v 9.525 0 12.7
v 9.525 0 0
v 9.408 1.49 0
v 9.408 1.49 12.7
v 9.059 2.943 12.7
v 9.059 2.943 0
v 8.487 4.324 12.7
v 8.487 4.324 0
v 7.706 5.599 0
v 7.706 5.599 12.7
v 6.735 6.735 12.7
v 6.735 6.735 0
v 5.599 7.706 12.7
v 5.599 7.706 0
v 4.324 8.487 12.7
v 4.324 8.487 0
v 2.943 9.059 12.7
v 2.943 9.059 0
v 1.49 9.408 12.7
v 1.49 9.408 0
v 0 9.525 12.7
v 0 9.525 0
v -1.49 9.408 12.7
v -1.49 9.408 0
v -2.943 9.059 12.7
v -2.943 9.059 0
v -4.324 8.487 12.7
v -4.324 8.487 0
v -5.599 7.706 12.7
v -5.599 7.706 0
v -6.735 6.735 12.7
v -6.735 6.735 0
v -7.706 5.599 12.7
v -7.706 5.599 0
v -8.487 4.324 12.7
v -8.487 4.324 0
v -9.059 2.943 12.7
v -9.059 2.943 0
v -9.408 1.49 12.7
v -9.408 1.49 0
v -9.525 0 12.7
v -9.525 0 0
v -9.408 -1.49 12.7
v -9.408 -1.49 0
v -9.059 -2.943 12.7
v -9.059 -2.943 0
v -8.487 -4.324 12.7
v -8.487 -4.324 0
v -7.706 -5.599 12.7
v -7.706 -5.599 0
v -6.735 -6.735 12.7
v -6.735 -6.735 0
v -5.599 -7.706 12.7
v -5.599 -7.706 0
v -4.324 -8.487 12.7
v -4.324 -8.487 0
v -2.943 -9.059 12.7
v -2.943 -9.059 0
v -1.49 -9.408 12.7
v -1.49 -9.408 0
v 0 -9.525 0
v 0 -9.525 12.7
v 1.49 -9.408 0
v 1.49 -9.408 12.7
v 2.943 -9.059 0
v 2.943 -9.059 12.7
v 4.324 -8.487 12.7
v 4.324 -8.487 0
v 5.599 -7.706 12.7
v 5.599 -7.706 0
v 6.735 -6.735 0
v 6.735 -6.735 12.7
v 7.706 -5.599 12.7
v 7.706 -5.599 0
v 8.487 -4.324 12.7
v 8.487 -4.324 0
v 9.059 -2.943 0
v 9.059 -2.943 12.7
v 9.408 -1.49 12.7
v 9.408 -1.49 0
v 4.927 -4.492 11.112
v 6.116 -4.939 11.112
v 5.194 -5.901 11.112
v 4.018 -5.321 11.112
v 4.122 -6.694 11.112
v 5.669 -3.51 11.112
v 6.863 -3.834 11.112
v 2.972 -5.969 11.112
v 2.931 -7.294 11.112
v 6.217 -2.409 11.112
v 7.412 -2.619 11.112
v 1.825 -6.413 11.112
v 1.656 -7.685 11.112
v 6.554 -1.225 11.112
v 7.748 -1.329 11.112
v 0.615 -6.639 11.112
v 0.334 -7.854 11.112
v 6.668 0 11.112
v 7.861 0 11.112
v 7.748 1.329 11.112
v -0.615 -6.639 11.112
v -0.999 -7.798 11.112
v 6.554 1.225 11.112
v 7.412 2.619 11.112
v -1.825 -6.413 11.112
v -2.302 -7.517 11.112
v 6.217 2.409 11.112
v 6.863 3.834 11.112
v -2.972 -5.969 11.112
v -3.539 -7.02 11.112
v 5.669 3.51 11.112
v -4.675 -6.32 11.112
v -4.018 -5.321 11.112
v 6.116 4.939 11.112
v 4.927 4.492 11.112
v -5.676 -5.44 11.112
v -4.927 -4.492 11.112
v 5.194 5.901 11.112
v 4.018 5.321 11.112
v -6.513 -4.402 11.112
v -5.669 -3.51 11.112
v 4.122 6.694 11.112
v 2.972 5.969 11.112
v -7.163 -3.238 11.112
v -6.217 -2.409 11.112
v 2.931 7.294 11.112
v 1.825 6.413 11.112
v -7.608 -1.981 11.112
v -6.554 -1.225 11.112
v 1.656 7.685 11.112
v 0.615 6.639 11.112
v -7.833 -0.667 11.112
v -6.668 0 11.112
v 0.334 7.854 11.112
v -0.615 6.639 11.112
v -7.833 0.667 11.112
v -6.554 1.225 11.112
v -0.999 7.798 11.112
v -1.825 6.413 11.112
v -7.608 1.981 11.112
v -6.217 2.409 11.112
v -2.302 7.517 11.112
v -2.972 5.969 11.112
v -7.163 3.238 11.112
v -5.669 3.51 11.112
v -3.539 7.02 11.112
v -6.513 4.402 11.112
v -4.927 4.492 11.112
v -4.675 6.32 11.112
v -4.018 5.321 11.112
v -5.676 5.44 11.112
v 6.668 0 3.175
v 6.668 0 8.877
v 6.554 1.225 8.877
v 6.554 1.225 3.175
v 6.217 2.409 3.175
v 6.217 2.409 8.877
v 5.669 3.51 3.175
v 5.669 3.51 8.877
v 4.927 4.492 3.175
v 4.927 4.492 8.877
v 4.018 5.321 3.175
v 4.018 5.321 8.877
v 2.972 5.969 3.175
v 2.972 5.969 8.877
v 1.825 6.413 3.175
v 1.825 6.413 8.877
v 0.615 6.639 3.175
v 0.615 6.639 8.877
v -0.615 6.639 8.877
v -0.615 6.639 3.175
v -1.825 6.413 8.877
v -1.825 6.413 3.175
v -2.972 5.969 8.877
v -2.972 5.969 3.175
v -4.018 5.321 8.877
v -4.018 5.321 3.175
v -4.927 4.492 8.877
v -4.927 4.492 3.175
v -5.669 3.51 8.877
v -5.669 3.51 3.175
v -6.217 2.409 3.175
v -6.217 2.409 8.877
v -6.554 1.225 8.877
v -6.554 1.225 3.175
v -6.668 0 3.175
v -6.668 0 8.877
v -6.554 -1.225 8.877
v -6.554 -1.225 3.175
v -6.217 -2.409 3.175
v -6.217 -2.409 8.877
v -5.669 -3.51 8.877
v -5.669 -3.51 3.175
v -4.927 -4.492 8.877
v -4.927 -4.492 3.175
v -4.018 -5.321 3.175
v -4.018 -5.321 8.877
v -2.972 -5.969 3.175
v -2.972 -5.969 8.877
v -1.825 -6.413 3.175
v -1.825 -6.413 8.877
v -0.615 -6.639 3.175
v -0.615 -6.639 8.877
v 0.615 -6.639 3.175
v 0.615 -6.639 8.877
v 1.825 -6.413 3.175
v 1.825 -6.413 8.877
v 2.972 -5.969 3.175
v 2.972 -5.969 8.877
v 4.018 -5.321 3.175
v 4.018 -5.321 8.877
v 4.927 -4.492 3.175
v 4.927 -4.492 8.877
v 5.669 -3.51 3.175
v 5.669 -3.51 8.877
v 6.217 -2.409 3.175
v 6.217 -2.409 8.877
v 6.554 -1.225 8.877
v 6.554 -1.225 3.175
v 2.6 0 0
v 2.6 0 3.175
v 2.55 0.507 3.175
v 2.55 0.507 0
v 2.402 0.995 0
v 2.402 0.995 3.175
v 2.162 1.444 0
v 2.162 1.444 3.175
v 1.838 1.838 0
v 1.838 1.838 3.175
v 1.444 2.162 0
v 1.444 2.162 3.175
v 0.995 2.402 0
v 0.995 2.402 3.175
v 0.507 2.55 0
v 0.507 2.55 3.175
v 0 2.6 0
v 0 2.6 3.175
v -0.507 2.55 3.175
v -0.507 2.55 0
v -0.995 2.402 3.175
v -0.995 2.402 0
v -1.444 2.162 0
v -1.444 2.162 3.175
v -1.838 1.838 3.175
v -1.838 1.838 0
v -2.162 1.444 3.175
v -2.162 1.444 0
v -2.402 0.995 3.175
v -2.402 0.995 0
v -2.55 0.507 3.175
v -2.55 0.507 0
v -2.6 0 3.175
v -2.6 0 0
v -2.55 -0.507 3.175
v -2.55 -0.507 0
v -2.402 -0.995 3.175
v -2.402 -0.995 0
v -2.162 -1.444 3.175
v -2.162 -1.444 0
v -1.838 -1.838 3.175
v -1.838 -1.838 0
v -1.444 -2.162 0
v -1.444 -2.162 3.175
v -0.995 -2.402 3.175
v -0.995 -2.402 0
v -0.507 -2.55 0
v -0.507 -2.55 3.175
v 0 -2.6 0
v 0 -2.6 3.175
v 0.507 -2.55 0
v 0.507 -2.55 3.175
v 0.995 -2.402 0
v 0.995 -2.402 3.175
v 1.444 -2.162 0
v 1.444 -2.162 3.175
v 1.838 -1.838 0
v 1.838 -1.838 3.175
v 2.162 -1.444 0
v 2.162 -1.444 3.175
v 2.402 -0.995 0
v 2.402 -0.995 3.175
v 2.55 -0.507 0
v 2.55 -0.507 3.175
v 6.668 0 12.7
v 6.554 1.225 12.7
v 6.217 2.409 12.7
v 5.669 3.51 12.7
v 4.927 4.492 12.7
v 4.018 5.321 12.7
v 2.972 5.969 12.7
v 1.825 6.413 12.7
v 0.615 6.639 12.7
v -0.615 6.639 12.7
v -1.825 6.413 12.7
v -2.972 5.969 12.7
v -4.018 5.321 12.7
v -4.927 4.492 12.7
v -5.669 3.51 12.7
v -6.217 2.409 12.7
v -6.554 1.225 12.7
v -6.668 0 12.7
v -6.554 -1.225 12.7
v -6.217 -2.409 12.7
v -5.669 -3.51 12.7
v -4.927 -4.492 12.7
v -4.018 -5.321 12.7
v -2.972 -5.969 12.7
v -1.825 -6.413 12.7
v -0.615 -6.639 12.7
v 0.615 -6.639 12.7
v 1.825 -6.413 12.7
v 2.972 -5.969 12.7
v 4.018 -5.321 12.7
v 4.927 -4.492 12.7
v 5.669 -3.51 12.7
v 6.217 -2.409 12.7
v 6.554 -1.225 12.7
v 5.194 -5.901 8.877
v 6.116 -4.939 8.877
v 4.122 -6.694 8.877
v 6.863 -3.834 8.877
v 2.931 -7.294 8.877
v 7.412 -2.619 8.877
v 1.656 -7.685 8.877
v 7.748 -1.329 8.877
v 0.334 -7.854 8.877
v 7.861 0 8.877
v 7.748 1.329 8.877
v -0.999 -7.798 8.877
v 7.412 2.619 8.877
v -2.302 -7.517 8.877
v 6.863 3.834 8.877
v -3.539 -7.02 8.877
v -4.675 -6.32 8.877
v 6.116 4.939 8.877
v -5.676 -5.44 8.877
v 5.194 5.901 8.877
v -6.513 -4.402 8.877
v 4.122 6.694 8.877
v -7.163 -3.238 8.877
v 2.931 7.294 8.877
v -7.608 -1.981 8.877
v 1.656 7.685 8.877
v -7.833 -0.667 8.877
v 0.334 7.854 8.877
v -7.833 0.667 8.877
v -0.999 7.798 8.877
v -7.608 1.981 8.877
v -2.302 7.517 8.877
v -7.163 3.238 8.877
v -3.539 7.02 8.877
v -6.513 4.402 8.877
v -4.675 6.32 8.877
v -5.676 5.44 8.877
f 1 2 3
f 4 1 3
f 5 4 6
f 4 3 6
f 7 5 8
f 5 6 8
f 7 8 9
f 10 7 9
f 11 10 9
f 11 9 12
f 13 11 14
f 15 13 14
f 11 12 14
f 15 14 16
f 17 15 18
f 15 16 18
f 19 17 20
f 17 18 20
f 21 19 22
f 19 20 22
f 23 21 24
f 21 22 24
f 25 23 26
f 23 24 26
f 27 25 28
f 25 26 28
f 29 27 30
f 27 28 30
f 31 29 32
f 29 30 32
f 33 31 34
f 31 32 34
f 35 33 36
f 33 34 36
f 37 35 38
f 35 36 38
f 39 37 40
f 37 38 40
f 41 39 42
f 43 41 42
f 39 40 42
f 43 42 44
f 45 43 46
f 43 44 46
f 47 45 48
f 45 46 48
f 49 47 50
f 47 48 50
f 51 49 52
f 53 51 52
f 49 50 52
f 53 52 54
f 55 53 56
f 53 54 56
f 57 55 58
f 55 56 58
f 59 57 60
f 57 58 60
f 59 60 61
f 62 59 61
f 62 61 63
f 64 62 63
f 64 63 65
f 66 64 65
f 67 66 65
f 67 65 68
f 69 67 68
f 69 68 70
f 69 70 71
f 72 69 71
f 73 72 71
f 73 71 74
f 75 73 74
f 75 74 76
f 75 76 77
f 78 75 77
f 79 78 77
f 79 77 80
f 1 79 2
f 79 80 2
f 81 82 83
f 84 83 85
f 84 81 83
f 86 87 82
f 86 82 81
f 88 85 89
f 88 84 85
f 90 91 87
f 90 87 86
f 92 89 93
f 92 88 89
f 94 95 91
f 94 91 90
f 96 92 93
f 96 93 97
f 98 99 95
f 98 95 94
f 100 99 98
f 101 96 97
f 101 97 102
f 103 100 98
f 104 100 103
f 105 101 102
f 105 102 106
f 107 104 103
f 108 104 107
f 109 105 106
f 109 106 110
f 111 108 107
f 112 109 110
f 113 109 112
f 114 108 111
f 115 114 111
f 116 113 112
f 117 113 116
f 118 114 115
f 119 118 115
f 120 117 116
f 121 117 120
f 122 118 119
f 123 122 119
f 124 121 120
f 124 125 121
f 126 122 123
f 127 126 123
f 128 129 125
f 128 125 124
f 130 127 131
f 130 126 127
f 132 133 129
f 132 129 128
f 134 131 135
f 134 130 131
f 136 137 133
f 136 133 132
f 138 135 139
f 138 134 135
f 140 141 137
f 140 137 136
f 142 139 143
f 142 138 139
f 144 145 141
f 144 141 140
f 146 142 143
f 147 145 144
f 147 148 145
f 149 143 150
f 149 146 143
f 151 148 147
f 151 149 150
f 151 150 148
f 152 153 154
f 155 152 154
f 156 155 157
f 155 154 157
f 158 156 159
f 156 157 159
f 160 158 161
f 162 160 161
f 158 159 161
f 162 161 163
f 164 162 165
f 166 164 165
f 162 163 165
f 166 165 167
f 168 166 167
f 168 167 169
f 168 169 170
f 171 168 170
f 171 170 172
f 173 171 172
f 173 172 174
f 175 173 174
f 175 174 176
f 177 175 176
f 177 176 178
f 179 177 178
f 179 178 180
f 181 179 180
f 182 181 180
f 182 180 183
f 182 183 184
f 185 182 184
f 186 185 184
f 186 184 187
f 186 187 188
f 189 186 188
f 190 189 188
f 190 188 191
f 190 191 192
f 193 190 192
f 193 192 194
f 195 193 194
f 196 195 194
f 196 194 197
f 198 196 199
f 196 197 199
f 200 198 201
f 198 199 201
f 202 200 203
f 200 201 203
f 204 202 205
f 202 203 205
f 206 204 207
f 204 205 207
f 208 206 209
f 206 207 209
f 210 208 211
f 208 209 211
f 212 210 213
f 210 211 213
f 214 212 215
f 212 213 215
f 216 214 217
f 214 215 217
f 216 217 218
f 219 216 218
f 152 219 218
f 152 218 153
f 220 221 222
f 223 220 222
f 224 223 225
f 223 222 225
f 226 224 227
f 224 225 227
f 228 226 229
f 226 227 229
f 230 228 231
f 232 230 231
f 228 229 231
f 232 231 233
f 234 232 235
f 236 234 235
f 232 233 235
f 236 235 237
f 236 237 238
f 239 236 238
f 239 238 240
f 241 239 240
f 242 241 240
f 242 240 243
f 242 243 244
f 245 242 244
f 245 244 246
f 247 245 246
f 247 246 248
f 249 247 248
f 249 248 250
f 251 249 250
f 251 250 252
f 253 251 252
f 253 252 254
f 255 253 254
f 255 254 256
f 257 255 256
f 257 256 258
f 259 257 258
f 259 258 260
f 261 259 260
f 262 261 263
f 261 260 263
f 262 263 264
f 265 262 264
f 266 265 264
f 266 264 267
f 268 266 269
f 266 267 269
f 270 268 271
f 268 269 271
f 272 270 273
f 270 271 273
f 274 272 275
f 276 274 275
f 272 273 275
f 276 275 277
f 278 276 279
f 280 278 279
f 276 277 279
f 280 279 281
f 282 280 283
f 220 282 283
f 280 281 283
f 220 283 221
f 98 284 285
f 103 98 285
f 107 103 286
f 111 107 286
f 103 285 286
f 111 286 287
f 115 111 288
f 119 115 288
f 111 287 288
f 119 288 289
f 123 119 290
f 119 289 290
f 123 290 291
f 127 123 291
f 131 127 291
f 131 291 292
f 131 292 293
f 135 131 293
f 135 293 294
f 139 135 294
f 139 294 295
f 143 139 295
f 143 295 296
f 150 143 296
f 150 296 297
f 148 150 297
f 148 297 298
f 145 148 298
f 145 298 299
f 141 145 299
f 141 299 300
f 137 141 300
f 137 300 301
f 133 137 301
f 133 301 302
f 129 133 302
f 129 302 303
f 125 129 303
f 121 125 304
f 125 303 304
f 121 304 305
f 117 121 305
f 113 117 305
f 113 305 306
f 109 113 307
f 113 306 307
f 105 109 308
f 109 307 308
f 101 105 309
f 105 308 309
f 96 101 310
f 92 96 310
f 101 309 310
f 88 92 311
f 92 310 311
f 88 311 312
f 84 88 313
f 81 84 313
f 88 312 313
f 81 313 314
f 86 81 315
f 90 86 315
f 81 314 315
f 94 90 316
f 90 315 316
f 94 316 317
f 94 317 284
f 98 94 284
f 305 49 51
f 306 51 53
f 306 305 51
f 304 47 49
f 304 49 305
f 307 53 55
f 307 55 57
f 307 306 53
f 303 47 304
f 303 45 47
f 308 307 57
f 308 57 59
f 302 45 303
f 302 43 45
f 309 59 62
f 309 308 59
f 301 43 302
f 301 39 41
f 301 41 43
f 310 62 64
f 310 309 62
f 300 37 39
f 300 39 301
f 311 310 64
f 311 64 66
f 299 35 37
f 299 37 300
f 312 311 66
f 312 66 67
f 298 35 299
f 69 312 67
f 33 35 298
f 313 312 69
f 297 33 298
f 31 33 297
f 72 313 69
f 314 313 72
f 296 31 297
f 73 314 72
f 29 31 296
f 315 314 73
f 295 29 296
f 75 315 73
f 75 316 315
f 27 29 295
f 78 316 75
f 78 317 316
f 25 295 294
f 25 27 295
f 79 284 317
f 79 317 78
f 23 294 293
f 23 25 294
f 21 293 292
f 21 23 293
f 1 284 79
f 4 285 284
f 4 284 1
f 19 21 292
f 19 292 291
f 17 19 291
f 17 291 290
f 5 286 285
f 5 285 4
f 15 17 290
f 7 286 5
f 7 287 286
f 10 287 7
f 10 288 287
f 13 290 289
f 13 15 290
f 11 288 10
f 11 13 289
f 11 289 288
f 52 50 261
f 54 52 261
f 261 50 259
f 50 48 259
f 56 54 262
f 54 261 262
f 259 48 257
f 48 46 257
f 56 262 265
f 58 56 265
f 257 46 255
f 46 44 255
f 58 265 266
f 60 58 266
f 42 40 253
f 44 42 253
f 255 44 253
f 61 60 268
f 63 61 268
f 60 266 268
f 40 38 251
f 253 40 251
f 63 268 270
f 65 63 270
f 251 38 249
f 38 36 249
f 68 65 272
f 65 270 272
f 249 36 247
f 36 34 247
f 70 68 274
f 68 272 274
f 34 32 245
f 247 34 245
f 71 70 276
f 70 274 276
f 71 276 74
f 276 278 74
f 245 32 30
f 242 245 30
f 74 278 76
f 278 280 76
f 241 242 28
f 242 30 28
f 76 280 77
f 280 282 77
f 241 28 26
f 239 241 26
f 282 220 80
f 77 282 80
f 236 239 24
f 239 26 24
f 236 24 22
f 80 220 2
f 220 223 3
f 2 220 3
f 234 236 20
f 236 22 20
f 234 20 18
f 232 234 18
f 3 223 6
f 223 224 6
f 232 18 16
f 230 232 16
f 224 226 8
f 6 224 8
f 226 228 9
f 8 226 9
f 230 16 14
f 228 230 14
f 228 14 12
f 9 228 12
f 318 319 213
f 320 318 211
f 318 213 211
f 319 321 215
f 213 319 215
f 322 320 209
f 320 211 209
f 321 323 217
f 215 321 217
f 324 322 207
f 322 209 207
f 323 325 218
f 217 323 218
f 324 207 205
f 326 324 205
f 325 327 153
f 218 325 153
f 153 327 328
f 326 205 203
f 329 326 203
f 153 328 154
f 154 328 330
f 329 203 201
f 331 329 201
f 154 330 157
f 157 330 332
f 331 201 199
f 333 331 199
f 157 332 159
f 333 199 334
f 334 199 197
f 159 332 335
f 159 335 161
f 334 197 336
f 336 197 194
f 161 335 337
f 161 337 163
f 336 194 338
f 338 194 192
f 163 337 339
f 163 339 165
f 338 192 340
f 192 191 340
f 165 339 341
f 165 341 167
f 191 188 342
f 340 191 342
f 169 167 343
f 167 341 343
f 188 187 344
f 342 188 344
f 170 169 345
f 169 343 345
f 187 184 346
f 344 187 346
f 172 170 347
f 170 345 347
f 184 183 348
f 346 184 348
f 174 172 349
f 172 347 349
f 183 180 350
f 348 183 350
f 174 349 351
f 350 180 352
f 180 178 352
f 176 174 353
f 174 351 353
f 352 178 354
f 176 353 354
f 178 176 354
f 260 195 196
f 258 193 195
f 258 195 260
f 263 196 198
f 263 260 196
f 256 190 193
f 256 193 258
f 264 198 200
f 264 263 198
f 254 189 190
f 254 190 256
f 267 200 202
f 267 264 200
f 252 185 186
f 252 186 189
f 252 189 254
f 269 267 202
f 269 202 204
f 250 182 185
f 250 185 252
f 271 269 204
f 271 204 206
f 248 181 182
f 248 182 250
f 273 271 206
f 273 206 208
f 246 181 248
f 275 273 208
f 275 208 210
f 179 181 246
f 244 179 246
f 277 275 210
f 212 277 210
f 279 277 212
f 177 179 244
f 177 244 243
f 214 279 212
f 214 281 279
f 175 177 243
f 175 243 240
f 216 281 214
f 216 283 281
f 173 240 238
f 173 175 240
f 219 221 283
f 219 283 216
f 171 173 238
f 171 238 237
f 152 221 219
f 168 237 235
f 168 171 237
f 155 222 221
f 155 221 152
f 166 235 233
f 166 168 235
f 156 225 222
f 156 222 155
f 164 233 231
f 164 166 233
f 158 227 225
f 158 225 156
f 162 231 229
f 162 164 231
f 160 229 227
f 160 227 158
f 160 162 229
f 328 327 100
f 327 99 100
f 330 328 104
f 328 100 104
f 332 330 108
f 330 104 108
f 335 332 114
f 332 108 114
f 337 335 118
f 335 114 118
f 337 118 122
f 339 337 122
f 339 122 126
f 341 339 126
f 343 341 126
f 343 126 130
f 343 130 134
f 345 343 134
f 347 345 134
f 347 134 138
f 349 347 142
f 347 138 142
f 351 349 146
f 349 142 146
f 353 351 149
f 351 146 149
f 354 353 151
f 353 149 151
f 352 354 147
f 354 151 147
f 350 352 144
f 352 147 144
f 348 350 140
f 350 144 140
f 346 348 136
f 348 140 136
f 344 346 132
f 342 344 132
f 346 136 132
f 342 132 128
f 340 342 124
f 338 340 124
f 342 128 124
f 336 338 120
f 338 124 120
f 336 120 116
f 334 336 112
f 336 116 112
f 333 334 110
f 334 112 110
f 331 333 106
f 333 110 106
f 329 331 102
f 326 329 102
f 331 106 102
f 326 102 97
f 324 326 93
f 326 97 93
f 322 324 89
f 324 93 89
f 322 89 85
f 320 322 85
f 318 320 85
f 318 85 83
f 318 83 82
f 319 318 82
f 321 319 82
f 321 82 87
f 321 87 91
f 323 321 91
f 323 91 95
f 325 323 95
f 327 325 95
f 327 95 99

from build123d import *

# Parameters (mm, degrees)
F0_R     = 9.525
F1_DEPTH = 12.7
F2_R     = 6.6675
F3_DEPTH = 9.525
F4_R     = 2.59969
F5_DEPTH = 25.4
F6_W     = 1.1938
F6_H     = 2.2352


with BuildPart() as f1:
    # F0 (on Top) → F1 (new body)
    with BuildSketch(Plane.XY):
        Circle(F0_R)
    extrude(amount=F1_DEPTH)

    # F2 (on face) → F3 (cut)
    with BuildSketch(Plane.XY.offset(12.7)):
        Circle(F2_R)
    extrude(amount=-F3_DEPTH, mode=Mode.SUBTRACT)

    # F4 (on face) → F5 (cut)
    with BuildSketch(Plane.XY.offset(3.175)):
        Circle(F4_R)
    extrude(amount=-F5_DEPTH, mode=Mode.SUBTRACT)

    # F6 (on Front) → F7 (revolve, cut)
    with BuildSketch(Plane.XZ):
        with Locations((7.2644, 9.9949)):
            Rectangle(F6_W, F6_H)
    revolve(axis=Axis((0, 0, 19.022157), (0, 0, 1)), mode=Mode.SUBTRACT)


solid = f1.part
